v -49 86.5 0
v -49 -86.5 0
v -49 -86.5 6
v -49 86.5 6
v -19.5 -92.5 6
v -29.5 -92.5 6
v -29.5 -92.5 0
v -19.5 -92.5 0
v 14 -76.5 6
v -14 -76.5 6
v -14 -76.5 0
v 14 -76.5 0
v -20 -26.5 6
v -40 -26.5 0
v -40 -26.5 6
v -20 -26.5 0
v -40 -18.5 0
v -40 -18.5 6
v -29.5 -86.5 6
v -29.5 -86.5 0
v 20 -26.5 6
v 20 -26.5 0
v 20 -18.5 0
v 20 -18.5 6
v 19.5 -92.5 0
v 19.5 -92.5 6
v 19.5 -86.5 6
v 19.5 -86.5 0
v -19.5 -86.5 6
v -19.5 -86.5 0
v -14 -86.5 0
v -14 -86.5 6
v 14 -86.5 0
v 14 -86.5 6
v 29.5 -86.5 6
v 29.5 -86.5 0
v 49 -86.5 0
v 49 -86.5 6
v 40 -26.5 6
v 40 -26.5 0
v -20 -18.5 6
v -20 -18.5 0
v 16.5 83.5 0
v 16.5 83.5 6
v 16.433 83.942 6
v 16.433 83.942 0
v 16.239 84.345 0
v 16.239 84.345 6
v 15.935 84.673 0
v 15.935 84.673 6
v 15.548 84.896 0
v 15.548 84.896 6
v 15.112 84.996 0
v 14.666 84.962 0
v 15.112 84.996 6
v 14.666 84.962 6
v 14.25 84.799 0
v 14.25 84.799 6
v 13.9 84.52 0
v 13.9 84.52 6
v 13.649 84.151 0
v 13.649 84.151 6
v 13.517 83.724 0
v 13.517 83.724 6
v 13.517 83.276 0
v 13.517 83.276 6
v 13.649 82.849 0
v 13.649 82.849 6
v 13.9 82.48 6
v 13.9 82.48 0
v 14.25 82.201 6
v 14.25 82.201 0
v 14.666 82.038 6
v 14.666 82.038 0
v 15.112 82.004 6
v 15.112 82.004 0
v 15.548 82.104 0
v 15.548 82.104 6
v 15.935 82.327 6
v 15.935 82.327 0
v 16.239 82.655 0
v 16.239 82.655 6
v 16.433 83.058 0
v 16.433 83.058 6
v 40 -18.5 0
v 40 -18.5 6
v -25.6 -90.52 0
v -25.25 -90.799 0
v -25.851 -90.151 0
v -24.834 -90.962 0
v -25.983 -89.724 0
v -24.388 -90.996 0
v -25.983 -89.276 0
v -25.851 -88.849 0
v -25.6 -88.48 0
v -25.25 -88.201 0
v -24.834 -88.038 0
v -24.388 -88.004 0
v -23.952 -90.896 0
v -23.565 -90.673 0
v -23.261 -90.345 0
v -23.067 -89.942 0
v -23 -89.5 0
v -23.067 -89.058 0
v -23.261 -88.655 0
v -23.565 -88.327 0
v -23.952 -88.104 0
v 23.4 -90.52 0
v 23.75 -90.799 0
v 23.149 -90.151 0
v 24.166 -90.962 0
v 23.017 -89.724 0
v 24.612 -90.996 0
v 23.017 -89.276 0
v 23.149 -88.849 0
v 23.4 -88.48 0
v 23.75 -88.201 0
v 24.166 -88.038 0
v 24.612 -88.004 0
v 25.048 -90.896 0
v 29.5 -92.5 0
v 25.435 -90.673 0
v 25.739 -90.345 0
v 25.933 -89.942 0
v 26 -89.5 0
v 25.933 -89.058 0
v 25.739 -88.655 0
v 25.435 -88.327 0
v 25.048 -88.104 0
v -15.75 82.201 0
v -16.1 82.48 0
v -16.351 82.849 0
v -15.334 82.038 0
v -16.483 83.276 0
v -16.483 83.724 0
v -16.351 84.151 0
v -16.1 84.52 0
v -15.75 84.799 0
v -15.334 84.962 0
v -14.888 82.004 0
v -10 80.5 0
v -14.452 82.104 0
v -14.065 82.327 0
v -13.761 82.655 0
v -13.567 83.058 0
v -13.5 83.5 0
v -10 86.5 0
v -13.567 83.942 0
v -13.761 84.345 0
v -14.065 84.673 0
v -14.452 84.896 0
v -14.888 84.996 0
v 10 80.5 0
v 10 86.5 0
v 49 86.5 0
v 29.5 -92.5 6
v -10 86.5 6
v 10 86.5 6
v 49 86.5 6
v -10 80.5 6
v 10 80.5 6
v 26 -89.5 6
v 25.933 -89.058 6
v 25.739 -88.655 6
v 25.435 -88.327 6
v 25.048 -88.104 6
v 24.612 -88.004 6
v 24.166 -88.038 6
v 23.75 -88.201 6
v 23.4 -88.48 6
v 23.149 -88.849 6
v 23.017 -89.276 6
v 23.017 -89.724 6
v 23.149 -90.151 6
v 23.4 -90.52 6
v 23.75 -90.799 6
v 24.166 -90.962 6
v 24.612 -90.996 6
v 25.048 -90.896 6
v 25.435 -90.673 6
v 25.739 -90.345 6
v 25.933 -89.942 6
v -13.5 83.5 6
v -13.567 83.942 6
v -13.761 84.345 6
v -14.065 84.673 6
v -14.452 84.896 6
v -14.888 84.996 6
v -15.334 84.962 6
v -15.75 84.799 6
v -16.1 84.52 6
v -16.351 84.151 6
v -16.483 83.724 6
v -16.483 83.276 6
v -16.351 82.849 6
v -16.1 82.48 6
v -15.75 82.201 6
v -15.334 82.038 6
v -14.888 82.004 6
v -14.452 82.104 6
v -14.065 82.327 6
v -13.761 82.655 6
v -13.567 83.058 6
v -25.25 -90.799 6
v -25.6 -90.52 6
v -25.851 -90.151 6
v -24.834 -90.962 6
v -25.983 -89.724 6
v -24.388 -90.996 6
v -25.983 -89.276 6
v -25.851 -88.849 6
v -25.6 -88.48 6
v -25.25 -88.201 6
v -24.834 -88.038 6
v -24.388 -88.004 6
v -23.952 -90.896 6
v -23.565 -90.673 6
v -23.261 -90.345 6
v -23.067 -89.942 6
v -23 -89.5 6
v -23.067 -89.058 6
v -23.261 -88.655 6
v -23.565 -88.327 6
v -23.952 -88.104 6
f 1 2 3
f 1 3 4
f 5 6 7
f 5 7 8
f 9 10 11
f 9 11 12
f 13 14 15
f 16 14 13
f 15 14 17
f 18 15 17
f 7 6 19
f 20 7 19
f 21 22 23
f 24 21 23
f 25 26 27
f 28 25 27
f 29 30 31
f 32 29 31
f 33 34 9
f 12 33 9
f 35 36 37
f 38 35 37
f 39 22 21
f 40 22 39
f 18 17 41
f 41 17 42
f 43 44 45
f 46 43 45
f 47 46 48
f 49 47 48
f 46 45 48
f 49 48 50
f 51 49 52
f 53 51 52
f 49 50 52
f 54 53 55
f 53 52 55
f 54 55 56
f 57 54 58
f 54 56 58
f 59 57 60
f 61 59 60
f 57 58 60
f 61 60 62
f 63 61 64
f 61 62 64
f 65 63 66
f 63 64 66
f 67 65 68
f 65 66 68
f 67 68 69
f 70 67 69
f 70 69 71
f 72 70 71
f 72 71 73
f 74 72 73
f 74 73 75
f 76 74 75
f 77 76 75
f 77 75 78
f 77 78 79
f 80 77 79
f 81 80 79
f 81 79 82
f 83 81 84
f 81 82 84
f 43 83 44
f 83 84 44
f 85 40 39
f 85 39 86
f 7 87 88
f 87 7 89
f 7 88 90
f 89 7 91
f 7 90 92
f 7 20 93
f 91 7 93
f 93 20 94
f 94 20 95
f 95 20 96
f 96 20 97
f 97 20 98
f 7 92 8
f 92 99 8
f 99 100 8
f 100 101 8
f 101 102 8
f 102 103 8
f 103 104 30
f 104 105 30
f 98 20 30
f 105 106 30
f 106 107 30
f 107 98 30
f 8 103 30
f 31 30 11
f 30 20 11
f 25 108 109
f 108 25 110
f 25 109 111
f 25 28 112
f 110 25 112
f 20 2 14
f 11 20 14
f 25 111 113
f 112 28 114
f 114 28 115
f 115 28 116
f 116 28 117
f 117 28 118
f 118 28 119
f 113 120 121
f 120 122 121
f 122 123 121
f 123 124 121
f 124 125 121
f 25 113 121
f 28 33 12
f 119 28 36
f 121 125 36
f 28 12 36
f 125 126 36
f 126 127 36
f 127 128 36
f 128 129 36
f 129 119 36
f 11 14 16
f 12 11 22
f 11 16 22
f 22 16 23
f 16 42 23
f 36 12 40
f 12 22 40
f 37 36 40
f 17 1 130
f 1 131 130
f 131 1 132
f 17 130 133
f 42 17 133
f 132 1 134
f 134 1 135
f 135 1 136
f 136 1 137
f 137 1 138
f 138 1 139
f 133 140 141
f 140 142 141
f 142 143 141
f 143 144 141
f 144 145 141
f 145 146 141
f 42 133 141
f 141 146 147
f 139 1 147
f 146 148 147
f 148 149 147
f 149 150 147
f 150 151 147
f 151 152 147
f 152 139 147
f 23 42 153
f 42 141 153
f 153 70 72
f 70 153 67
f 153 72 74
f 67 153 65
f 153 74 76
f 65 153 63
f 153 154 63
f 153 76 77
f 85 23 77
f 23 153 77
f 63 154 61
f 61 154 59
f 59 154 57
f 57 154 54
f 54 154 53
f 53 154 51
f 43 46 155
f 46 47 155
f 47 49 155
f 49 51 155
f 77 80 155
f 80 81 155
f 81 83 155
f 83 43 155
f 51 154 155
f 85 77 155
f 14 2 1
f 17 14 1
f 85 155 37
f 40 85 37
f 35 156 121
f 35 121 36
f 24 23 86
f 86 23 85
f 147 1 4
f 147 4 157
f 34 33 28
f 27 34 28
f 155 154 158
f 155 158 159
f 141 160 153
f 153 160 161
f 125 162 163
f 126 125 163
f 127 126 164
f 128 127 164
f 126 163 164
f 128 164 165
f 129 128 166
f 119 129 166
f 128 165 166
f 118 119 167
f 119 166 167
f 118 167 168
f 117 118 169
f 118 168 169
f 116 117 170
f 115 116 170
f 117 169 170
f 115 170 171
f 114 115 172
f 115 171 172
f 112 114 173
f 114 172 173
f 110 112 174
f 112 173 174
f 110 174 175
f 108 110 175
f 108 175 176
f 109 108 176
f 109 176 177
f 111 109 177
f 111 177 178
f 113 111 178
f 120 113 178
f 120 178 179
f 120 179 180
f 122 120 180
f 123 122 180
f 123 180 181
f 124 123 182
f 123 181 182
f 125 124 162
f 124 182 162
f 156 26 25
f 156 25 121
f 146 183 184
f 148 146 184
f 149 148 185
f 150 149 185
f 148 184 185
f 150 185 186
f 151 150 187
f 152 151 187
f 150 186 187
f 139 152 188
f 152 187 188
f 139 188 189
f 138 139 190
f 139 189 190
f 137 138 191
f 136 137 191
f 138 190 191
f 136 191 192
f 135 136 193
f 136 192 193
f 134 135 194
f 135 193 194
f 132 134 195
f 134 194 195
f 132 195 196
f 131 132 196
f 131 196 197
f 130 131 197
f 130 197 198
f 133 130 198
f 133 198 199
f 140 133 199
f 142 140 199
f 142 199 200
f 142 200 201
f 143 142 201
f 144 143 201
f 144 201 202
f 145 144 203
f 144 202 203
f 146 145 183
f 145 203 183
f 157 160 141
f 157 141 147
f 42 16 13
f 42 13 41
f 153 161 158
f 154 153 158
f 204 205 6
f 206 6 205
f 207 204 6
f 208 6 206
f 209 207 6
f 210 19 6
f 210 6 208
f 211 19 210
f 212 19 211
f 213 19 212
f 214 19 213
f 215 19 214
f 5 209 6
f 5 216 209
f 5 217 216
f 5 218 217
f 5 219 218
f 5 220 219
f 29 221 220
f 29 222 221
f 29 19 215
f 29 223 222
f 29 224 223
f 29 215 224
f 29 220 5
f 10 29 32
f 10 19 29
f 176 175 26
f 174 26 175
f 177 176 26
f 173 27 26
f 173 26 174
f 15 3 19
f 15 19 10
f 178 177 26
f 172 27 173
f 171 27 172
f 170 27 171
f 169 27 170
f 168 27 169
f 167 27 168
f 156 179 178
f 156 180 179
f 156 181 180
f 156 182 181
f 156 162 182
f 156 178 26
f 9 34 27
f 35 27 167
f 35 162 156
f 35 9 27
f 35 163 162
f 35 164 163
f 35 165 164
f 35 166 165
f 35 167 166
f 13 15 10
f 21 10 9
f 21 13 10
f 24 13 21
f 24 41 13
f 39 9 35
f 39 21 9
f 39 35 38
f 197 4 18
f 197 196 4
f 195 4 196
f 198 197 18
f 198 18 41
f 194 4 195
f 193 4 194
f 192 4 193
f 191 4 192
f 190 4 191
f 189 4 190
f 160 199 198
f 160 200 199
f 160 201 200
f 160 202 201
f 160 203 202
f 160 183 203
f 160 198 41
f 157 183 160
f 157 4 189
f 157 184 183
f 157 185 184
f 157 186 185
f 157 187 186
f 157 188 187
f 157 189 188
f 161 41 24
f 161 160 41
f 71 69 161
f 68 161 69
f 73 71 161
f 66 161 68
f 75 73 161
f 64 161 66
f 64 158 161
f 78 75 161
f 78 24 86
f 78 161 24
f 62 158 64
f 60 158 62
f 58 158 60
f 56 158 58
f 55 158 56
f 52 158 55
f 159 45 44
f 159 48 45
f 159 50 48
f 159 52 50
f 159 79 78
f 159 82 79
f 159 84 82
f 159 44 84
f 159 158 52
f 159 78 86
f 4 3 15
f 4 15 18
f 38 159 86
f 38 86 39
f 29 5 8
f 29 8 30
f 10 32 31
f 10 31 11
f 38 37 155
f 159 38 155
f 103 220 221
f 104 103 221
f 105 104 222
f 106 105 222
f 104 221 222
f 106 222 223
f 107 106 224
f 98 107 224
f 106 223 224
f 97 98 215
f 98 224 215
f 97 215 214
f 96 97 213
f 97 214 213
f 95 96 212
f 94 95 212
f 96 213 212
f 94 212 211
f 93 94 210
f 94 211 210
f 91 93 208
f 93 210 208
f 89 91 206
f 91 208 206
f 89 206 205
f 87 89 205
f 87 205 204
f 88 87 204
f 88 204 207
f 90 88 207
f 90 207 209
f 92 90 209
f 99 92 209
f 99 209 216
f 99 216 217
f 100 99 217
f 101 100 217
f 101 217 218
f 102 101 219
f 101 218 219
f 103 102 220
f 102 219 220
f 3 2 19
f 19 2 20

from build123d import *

# Parameters (mm, degrees)
ESQUISSE1_W             = 98
ESQUISSE1_H             = 173
ESQUISSE1_W_2           = 20
ESQUISSE1_H_2           = 8
BOSS_EXTRU_1_DEPTH      = 6
ESQUISSE2_W             = 10
ESQUISSE2_H             = 6
BOSS_EXTRU_2_DEPTH      = 6
ESQUISSE3_R             = 1.5
ENL_V_MAT_EXTRU_1_DEPTH = 6
ESQUISSE4_W             = 20
ESQUISSE4_H             = 6
ESQUISSE4_W_2           = 28
ESQUISSE4_H_2           = 10
ENL_V_MAT_EXTRU_2_DEPTH = 6


with BuildPart() as part:
    # Esquisse1 → Boss.-Extru.1 (new body)
    with BuildSketch(Plane.XY):
        Rectangle(ESQUISSE1_W, ESQUISSE1_H)
        with Locations((30, -22.5)):
            Rectangle(ESQUISSE1_W_2, ESQUISSE1_H_2, mode=Mode.SUBTRACT)
        with Locations((-30, -22.5)):
            Rectangle(ESQUISSE1_W_2, ESQUISSE1_H_2, mode=Mode.SUBTRACT)
    extrude(amount=BOSS_EXTRU_1_DEPTH)

    # Esquisse2 → Boss.-Extru.2 (add)
    with BuildSketch(Plane.XY.offset(6)):
        with Locations((24.5, -89.5)):
            Rectangle(ESQUISSE2_W, ESQUISSE2_H)
        with Locations((-24.5, -89.5)):
            Rectangle(ESQUISSE2_W, ESQUISSE2_H)
    extrude(amount=-BOSS_EXTRU_2_DEPTH)

    # Esquisse3 → Enlèv. mat.-Extru.1 (cut)
    with BuildSketch(Plane.XY.offset(6)):
        with Locations((-15, 83.5)):
            Circle(ESQUISSE3_R)
        with Locations((24.5, -89.5)):
            Circle(ESQUISSE3_R)
        with Locations((-24.5, -89.5)):
            Circle(ESQUISSE3_R)
        with Locations((15, 83.5)):
            Circle(ESQUISSE3_R)
    extrude(amount=-ENL_V_MAT_EXTRU_1_DEPTH, mode=Mode.SUBTRACT)

    # Esquisse4 → Enlèv. mat.-Extru.2 (cut)
    with BuildSketch(Plane.XY.offset(6)):
        with Locations((0, 83.5)):
            Rectangle(ESQUISSE4_W, ESQUISSE4_H)
        with Locations((0, -81.5)):
            Rectangle(ESQUISSE4_W_2, ESQUISSE4_H_2)
    extrude(amount=-ENL_V_MAT_EXTRU_2_DEPTH, mode=Mode.SUBTRACT)


solid = part.part
